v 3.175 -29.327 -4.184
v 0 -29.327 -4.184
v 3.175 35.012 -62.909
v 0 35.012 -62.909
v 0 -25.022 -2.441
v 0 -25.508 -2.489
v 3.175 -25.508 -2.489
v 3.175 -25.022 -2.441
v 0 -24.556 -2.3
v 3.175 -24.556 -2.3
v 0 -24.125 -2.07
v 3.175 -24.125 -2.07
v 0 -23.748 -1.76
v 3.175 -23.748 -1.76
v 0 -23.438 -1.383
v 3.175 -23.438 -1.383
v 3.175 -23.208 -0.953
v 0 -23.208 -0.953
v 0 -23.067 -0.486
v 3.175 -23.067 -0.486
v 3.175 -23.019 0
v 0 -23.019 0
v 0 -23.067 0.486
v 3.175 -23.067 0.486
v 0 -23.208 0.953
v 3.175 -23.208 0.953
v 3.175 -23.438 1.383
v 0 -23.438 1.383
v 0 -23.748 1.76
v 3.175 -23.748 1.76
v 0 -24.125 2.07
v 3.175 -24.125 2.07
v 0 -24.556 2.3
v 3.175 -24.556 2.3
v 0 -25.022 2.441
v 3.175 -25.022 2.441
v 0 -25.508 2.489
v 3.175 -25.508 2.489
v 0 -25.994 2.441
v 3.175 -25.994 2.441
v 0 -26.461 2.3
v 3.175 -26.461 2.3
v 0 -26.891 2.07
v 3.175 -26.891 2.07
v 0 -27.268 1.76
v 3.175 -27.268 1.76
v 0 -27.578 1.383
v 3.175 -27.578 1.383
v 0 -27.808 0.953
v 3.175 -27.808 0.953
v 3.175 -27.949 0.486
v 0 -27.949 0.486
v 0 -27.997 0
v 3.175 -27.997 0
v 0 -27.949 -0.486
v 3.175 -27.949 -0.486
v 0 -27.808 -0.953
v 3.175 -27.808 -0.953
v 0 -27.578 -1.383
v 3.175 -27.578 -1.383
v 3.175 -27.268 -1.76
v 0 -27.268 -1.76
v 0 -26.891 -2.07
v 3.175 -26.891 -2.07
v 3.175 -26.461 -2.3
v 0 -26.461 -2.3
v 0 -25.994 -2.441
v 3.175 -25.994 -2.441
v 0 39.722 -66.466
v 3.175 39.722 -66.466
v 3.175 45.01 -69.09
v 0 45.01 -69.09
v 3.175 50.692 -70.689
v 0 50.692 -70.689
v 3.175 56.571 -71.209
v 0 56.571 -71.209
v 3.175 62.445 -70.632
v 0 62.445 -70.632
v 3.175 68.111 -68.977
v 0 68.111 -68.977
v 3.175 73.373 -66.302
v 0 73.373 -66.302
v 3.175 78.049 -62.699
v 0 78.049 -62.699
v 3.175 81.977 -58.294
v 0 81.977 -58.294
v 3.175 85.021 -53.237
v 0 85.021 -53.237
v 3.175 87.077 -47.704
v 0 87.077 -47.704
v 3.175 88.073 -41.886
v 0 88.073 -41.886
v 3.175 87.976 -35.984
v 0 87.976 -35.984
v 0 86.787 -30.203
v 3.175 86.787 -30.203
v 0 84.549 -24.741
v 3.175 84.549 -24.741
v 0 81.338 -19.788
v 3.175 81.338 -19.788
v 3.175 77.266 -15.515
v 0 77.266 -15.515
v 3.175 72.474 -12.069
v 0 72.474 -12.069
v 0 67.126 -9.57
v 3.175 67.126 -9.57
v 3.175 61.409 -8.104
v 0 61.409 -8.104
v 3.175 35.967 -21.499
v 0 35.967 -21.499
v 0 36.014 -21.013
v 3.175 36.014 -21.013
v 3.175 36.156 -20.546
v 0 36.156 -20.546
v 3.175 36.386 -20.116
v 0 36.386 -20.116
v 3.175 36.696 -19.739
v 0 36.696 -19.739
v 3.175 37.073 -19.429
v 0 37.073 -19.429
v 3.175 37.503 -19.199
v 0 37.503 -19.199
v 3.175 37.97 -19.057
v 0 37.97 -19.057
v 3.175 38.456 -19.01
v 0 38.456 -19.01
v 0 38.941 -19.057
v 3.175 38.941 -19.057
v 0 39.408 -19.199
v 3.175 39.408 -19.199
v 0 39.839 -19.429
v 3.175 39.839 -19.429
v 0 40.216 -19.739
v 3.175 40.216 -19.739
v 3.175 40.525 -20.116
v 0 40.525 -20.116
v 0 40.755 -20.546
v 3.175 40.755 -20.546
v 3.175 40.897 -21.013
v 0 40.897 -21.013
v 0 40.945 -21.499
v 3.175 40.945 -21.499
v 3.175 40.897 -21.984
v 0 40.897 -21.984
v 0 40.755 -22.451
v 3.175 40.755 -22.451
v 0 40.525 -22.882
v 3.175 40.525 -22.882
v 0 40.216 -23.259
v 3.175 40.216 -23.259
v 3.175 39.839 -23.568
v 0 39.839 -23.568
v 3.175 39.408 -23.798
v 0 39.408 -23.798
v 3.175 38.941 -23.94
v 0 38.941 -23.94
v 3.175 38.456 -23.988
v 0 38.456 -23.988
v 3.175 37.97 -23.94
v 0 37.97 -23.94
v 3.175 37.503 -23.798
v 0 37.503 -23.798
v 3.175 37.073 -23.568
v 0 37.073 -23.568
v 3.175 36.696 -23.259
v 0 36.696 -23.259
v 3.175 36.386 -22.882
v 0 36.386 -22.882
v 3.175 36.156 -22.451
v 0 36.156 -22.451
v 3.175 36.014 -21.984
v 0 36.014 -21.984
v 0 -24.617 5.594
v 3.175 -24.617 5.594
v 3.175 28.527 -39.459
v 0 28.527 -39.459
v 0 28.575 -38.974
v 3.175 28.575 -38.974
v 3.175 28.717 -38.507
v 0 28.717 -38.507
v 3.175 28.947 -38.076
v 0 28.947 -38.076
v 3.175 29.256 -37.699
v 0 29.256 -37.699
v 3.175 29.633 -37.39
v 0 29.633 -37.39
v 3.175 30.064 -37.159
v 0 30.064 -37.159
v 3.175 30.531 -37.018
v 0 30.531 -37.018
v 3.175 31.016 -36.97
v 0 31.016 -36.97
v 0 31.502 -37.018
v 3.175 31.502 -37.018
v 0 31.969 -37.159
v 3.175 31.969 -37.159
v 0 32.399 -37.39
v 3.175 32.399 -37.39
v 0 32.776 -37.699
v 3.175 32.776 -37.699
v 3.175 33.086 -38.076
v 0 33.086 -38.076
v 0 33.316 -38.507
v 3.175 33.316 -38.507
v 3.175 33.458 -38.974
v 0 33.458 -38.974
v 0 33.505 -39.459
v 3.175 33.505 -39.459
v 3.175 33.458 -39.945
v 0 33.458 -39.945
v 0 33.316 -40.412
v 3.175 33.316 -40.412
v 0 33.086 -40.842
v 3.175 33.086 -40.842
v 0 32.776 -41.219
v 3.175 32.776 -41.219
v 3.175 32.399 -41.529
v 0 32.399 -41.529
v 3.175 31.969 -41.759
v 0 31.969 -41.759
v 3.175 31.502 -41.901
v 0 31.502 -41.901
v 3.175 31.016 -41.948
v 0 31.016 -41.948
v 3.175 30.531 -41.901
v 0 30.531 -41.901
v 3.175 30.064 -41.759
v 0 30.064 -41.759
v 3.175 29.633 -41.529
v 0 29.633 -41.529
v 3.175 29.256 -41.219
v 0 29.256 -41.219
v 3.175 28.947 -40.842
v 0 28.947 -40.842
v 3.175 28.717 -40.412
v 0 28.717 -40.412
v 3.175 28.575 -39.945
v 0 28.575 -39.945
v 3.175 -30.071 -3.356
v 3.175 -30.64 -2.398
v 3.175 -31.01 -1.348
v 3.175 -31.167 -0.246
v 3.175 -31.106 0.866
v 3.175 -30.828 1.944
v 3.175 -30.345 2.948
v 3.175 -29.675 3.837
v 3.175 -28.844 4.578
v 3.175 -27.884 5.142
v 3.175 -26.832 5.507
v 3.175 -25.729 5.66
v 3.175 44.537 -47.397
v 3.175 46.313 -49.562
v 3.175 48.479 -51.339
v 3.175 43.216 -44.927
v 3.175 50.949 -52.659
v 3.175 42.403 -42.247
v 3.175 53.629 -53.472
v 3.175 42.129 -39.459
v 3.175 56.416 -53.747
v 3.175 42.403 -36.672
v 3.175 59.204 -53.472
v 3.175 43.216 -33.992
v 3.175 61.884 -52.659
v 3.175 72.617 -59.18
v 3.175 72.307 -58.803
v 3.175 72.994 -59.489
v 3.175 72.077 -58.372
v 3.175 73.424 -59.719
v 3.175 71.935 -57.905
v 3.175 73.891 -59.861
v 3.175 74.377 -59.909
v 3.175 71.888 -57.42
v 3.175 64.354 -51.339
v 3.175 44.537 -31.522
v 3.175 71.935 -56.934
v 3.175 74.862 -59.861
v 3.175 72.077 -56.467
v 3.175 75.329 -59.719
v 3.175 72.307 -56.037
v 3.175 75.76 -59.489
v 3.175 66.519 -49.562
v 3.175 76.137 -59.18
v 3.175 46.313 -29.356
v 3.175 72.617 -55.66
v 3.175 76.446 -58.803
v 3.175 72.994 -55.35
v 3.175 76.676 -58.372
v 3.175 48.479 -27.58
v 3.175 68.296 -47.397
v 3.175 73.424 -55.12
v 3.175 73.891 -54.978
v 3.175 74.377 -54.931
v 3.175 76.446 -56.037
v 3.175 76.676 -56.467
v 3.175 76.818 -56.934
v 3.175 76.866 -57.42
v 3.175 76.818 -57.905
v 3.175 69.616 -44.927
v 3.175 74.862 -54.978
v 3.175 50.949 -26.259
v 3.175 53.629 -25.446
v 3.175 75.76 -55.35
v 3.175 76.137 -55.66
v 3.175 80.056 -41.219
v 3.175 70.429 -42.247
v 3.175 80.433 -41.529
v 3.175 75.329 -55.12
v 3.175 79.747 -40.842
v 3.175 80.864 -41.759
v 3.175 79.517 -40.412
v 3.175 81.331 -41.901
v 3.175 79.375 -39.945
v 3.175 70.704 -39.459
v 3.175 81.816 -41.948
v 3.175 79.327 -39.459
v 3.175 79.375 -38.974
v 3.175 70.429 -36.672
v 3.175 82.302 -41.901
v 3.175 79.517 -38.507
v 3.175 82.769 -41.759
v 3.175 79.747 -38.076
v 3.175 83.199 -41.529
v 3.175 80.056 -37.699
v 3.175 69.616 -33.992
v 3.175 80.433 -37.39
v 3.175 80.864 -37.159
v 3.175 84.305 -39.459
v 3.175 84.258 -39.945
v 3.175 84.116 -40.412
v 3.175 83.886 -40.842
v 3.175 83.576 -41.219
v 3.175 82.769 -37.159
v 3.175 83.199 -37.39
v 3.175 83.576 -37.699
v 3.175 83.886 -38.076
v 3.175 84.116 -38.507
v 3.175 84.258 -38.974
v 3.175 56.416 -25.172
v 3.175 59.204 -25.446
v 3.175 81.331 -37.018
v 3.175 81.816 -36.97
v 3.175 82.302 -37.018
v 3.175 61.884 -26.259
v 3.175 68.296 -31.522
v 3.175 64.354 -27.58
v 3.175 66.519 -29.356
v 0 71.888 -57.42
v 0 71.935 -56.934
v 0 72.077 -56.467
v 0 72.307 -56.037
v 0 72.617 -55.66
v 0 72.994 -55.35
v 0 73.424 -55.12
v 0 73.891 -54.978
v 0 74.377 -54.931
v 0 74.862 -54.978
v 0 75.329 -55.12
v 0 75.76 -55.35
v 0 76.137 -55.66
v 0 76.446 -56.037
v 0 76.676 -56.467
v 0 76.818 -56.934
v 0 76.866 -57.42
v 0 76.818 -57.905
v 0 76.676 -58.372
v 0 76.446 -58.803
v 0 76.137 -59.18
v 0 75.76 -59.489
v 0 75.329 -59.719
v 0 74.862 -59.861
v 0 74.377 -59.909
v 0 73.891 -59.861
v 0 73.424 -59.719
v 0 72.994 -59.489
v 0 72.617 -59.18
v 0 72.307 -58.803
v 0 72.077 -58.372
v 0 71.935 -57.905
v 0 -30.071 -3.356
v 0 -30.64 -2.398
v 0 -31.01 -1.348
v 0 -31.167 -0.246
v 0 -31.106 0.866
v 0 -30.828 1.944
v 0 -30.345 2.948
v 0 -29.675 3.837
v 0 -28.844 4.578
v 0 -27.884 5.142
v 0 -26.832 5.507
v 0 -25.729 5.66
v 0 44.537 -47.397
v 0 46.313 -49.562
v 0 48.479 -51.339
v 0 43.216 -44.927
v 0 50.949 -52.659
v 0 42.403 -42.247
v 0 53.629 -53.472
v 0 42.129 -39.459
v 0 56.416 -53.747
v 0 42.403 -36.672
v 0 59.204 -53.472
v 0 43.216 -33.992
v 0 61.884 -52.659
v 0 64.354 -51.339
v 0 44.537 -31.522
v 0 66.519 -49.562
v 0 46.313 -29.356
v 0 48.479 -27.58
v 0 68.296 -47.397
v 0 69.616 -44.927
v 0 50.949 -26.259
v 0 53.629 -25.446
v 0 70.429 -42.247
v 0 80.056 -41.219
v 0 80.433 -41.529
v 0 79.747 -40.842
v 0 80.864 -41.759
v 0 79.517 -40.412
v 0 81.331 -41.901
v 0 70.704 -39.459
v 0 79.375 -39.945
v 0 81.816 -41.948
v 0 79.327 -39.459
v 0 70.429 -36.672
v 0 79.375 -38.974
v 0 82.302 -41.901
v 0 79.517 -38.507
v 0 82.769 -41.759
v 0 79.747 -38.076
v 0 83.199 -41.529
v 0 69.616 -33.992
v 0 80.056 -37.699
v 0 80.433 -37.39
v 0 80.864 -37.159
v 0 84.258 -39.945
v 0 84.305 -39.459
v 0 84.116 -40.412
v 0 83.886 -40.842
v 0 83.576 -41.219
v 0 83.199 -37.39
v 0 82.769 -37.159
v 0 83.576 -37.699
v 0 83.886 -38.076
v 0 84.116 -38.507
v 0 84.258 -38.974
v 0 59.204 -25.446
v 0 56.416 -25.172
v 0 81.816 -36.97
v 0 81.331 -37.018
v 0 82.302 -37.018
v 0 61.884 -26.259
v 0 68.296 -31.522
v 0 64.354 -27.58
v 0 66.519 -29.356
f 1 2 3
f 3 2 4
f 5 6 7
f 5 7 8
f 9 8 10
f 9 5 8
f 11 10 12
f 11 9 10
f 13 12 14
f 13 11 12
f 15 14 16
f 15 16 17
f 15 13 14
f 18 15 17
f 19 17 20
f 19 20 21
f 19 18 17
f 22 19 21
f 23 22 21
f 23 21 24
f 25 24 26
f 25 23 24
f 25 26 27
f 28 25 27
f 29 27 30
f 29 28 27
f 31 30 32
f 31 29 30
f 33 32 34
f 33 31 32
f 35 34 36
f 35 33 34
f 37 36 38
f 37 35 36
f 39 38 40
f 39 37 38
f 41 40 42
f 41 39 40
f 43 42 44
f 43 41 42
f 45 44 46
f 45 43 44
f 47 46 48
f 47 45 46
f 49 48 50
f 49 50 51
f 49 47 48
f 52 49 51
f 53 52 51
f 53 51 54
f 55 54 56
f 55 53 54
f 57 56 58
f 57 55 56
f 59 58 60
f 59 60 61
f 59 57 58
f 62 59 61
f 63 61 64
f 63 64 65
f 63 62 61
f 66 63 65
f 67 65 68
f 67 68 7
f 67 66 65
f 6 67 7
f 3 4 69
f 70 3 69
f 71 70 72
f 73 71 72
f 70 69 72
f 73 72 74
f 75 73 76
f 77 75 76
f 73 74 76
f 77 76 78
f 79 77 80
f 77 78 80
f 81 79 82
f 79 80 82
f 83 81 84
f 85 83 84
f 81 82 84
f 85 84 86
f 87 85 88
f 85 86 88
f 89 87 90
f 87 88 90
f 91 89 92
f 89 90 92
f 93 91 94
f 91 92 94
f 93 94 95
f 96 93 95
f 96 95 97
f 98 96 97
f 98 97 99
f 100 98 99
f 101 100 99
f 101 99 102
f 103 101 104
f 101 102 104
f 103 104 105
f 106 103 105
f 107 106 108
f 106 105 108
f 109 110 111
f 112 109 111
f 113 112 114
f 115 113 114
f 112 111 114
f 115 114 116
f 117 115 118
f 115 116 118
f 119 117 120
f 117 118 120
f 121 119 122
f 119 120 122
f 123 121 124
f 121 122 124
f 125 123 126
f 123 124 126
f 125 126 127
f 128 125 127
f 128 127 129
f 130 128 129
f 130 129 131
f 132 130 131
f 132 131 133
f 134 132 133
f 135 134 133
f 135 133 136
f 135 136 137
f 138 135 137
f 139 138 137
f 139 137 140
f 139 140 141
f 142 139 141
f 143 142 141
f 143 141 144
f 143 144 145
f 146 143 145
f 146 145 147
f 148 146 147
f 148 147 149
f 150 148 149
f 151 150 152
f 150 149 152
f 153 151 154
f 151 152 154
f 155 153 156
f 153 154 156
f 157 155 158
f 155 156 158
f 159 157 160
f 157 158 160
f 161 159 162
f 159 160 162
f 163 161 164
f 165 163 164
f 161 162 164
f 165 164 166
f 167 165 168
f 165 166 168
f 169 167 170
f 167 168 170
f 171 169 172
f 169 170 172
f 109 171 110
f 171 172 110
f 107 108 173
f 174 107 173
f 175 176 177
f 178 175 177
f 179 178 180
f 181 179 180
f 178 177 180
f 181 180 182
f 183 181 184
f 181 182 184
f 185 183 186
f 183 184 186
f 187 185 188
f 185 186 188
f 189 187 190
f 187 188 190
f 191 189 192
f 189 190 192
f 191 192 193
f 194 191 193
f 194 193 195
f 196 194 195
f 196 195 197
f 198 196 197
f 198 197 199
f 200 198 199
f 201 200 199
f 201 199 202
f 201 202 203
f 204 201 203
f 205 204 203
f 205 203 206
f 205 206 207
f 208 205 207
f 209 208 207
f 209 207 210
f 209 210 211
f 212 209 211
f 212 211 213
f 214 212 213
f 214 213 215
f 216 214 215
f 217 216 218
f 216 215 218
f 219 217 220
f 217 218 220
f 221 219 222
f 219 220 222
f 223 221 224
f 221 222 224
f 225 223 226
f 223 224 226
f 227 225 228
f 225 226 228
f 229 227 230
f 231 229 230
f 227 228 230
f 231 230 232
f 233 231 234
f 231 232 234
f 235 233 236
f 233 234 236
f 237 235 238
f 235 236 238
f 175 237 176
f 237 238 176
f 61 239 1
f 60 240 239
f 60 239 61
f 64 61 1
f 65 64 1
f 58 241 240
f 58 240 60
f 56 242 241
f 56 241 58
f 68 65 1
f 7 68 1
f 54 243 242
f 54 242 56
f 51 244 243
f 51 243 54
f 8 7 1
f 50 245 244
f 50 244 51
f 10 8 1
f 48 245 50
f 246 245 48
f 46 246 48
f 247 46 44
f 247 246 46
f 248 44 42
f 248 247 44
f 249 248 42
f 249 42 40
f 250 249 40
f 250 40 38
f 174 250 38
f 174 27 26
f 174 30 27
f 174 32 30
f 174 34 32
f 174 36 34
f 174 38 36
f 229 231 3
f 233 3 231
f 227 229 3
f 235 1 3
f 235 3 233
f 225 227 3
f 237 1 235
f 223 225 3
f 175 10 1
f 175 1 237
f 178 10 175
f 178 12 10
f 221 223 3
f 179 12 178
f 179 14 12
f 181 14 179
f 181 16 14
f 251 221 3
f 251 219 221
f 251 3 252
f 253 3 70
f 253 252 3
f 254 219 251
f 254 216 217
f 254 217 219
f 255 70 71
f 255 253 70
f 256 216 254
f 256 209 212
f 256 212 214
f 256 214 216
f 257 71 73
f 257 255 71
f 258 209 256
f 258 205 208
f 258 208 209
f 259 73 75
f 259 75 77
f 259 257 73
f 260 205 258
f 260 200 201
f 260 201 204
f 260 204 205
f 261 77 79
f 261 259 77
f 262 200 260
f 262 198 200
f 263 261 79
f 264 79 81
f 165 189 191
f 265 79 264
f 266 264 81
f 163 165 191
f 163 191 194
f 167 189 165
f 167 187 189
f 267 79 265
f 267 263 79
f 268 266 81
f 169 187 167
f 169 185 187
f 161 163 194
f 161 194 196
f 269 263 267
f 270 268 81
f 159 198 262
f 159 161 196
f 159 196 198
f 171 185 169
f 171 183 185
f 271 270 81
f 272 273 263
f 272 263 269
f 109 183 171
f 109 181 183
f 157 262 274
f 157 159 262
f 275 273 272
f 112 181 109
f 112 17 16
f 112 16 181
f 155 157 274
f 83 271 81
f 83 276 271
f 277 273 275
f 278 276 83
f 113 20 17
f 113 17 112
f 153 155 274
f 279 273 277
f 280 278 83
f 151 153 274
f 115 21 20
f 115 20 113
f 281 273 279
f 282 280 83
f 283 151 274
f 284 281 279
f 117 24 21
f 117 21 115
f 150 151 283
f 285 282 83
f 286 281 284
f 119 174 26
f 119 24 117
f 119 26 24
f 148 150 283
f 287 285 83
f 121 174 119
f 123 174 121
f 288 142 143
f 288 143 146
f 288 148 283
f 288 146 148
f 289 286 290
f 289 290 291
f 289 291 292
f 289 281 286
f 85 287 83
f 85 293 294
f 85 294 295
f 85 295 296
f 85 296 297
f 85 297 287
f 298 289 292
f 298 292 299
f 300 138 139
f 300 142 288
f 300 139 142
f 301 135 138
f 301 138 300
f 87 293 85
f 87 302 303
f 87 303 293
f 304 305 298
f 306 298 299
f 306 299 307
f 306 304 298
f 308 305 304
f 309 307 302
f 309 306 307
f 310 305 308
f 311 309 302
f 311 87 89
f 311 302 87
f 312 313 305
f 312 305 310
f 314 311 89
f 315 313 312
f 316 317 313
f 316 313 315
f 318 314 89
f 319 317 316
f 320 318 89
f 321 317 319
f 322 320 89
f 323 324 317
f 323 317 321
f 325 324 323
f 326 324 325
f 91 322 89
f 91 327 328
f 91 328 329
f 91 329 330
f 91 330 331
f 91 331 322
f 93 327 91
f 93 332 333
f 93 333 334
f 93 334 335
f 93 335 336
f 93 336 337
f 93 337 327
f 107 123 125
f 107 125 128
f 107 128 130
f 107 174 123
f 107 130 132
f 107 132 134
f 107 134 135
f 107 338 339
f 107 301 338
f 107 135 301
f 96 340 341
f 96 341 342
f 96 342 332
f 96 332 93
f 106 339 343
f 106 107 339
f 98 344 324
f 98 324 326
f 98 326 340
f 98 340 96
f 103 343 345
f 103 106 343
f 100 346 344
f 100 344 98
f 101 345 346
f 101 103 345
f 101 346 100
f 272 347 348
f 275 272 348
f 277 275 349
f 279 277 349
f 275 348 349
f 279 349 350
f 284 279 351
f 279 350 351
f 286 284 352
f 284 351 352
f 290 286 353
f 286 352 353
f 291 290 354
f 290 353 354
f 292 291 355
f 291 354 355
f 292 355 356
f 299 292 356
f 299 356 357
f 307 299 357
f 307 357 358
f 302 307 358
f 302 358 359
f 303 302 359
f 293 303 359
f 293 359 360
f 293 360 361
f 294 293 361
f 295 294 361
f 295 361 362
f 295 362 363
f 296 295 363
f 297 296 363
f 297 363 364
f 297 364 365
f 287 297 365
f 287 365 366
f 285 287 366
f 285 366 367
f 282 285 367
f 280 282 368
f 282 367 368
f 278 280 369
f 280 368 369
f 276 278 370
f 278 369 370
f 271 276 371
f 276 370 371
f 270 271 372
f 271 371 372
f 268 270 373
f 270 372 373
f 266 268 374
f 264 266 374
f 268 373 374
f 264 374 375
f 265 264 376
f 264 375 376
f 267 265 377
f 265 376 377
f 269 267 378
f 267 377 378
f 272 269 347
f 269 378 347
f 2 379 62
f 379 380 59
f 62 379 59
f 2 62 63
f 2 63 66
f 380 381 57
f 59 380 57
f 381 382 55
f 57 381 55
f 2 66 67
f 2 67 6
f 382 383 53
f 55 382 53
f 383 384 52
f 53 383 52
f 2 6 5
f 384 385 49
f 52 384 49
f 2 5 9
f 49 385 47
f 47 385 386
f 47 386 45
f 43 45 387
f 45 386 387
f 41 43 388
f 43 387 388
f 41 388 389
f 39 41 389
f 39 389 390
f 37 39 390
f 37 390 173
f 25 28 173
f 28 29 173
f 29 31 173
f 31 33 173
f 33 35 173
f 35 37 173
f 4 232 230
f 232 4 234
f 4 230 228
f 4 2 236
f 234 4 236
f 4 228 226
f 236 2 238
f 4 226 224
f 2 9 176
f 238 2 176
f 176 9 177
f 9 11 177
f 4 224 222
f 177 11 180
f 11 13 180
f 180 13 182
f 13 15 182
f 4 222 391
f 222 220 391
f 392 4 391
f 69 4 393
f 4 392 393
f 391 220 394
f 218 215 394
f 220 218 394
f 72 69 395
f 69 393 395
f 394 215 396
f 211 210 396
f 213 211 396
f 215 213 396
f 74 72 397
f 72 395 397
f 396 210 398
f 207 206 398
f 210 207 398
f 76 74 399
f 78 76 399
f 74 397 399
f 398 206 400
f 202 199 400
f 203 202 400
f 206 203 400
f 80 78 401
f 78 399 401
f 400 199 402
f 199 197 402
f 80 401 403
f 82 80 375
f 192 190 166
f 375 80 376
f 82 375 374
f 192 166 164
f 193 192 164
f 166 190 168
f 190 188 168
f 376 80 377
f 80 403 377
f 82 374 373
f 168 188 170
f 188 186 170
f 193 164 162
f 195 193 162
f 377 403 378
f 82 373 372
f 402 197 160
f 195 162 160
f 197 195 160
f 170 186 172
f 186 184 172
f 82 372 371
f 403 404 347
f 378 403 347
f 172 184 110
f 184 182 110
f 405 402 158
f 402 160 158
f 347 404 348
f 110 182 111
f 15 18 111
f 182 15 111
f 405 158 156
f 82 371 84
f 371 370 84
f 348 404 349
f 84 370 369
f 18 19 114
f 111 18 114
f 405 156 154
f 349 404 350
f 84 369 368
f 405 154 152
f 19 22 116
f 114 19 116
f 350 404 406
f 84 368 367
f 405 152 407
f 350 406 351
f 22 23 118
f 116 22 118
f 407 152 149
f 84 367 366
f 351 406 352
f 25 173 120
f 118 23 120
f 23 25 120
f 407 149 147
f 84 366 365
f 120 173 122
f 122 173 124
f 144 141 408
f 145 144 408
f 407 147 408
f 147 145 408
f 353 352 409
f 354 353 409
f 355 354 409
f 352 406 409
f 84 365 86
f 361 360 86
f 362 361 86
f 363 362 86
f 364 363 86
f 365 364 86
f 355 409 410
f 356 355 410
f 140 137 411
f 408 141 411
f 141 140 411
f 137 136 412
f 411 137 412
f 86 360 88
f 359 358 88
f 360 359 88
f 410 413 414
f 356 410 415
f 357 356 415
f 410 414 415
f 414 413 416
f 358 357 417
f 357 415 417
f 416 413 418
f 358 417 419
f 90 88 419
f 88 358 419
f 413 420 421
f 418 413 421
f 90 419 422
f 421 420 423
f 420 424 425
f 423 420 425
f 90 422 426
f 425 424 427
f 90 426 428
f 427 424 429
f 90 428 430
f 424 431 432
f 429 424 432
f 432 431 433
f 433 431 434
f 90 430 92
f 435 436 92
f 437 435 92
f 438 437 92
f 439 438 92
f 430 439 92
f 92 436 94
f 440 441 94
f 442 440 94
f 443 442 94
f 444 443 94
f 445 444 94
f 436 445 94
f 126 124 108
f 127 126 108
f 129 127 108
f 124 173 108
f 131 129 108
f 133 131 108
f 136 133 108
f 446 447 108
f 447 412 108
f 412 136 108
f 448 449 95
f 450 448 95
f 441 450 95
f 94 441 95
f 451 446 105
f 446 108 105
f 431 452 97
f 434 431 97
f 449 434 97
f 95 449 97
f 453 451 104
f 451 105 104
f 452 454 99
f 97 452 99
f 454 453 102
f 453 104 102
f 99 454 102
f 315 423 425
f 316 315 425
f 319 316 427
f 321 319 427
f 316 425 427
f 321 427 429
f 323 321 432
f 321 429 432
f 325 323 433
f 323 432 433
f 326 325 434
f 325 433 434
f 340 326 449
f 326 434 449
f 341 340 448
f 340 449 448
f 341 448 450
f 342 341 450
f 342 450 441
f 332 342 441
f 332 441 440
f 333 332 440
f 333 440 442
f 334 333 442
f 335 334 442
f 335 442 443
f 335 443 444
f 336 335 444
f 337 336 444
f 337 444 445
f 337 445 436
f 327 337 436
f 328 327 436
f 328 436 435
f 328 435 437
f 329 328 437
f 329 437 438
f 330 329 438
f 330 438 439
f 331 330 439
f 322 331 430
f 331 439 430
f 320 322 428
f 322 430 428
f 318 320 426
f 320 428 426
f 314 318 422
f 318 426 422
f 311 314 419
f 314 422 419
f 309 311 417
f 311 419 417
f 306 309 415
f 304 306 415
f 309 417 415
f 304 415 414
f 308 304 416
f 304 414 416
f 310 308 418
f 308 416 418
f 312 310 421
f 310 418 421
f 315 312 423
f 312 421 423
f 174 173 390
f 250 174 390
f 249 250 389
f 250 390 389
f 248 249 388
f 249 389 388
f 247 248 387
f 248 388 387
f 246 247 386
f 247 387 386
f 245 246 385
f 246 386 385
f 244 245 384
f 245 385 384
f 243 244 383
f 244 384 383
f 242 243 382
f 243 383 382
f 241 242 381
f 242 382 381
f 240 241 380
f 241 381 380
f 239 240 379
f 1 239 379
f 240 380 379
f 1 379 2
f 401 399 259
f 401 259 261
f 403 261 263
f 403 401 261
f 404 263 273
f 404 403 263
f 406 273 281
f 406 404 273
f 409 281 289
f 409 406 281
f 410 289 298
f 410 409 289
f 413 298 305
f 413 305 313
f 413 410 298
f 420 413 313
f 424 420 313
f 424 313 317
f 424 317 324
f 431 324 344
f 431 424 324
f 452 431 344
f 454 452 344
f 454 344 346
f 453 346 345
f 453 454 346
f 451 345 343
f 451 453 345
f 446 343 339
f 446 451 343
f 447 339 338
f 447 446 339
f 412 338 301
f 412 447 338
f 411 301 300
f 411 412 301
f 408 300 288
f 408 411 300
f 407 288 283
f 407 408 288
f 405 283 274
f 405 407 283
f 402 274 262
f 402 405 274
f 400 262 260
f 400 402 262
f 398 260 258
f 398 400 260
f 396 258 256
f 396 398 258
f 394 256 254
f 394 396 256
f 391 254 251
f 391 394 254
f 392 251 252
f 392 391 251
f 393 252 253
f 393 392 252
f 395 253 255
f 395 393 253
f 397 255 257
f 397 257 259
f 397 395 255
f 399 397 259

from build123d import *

# Parameters (mm, degrees)
SKETCH2_R                  = 14.2875
SKETCH2_R_2                = 2.4892
BOSS_EXTRUDE1_DEPTH        = 3.175
F_9_0_196_DIAMETER_HOLE1_D = 4.9784


with BuildPart() as part:
    # Sketch2 → Boss-Extrude1 (new body)
    with BuildSketch(Plane.YZ):
        with BuildLine():
            Line((-29.326675554, -4.183509014), (35.011739717, -62.909380508))
            ThreePointArc((35.011739717, -62.909380508), (85.021103942, -53.236877748), (61.408883727, -8.104219103))
            Line((61.408883727, -8.104219103), (-24.617425063, 5.593731781))
            ThreePointArc((-24.617425063, 5.593731781), (-30.611222597, 2.457934521), (-29.326675554, -4.183509014))
        make_face()
        with Locations(Location((56.416233929, -39.459217876, 0), (0, 0, 270))):
            Circle(SKETCH2_R, mode=Mode.SUBTRACT)
        with Locations(Location((-25.508113787, 0, 0), (0, 0, 270))):
            Circle(SKETCH2_R_2, mode=Mode.SUBTRACT)
    extrude(amount=BOSS_EXTRUDE1_DEPTH)

    # #9 (0.196) Diameter Hole1 (through all)
    with Locations(Plane.YZ.offset(3.175)):
        with Locations((81.816233929, -39.459217876), (74.376746171, -57.419730118), (31.016233929, -39.459217876), (38.455721687, -21.498705633)):
            Hole(F_9_0_196_DIAMETER_HOLE1_D / 2)


solid = part.part
